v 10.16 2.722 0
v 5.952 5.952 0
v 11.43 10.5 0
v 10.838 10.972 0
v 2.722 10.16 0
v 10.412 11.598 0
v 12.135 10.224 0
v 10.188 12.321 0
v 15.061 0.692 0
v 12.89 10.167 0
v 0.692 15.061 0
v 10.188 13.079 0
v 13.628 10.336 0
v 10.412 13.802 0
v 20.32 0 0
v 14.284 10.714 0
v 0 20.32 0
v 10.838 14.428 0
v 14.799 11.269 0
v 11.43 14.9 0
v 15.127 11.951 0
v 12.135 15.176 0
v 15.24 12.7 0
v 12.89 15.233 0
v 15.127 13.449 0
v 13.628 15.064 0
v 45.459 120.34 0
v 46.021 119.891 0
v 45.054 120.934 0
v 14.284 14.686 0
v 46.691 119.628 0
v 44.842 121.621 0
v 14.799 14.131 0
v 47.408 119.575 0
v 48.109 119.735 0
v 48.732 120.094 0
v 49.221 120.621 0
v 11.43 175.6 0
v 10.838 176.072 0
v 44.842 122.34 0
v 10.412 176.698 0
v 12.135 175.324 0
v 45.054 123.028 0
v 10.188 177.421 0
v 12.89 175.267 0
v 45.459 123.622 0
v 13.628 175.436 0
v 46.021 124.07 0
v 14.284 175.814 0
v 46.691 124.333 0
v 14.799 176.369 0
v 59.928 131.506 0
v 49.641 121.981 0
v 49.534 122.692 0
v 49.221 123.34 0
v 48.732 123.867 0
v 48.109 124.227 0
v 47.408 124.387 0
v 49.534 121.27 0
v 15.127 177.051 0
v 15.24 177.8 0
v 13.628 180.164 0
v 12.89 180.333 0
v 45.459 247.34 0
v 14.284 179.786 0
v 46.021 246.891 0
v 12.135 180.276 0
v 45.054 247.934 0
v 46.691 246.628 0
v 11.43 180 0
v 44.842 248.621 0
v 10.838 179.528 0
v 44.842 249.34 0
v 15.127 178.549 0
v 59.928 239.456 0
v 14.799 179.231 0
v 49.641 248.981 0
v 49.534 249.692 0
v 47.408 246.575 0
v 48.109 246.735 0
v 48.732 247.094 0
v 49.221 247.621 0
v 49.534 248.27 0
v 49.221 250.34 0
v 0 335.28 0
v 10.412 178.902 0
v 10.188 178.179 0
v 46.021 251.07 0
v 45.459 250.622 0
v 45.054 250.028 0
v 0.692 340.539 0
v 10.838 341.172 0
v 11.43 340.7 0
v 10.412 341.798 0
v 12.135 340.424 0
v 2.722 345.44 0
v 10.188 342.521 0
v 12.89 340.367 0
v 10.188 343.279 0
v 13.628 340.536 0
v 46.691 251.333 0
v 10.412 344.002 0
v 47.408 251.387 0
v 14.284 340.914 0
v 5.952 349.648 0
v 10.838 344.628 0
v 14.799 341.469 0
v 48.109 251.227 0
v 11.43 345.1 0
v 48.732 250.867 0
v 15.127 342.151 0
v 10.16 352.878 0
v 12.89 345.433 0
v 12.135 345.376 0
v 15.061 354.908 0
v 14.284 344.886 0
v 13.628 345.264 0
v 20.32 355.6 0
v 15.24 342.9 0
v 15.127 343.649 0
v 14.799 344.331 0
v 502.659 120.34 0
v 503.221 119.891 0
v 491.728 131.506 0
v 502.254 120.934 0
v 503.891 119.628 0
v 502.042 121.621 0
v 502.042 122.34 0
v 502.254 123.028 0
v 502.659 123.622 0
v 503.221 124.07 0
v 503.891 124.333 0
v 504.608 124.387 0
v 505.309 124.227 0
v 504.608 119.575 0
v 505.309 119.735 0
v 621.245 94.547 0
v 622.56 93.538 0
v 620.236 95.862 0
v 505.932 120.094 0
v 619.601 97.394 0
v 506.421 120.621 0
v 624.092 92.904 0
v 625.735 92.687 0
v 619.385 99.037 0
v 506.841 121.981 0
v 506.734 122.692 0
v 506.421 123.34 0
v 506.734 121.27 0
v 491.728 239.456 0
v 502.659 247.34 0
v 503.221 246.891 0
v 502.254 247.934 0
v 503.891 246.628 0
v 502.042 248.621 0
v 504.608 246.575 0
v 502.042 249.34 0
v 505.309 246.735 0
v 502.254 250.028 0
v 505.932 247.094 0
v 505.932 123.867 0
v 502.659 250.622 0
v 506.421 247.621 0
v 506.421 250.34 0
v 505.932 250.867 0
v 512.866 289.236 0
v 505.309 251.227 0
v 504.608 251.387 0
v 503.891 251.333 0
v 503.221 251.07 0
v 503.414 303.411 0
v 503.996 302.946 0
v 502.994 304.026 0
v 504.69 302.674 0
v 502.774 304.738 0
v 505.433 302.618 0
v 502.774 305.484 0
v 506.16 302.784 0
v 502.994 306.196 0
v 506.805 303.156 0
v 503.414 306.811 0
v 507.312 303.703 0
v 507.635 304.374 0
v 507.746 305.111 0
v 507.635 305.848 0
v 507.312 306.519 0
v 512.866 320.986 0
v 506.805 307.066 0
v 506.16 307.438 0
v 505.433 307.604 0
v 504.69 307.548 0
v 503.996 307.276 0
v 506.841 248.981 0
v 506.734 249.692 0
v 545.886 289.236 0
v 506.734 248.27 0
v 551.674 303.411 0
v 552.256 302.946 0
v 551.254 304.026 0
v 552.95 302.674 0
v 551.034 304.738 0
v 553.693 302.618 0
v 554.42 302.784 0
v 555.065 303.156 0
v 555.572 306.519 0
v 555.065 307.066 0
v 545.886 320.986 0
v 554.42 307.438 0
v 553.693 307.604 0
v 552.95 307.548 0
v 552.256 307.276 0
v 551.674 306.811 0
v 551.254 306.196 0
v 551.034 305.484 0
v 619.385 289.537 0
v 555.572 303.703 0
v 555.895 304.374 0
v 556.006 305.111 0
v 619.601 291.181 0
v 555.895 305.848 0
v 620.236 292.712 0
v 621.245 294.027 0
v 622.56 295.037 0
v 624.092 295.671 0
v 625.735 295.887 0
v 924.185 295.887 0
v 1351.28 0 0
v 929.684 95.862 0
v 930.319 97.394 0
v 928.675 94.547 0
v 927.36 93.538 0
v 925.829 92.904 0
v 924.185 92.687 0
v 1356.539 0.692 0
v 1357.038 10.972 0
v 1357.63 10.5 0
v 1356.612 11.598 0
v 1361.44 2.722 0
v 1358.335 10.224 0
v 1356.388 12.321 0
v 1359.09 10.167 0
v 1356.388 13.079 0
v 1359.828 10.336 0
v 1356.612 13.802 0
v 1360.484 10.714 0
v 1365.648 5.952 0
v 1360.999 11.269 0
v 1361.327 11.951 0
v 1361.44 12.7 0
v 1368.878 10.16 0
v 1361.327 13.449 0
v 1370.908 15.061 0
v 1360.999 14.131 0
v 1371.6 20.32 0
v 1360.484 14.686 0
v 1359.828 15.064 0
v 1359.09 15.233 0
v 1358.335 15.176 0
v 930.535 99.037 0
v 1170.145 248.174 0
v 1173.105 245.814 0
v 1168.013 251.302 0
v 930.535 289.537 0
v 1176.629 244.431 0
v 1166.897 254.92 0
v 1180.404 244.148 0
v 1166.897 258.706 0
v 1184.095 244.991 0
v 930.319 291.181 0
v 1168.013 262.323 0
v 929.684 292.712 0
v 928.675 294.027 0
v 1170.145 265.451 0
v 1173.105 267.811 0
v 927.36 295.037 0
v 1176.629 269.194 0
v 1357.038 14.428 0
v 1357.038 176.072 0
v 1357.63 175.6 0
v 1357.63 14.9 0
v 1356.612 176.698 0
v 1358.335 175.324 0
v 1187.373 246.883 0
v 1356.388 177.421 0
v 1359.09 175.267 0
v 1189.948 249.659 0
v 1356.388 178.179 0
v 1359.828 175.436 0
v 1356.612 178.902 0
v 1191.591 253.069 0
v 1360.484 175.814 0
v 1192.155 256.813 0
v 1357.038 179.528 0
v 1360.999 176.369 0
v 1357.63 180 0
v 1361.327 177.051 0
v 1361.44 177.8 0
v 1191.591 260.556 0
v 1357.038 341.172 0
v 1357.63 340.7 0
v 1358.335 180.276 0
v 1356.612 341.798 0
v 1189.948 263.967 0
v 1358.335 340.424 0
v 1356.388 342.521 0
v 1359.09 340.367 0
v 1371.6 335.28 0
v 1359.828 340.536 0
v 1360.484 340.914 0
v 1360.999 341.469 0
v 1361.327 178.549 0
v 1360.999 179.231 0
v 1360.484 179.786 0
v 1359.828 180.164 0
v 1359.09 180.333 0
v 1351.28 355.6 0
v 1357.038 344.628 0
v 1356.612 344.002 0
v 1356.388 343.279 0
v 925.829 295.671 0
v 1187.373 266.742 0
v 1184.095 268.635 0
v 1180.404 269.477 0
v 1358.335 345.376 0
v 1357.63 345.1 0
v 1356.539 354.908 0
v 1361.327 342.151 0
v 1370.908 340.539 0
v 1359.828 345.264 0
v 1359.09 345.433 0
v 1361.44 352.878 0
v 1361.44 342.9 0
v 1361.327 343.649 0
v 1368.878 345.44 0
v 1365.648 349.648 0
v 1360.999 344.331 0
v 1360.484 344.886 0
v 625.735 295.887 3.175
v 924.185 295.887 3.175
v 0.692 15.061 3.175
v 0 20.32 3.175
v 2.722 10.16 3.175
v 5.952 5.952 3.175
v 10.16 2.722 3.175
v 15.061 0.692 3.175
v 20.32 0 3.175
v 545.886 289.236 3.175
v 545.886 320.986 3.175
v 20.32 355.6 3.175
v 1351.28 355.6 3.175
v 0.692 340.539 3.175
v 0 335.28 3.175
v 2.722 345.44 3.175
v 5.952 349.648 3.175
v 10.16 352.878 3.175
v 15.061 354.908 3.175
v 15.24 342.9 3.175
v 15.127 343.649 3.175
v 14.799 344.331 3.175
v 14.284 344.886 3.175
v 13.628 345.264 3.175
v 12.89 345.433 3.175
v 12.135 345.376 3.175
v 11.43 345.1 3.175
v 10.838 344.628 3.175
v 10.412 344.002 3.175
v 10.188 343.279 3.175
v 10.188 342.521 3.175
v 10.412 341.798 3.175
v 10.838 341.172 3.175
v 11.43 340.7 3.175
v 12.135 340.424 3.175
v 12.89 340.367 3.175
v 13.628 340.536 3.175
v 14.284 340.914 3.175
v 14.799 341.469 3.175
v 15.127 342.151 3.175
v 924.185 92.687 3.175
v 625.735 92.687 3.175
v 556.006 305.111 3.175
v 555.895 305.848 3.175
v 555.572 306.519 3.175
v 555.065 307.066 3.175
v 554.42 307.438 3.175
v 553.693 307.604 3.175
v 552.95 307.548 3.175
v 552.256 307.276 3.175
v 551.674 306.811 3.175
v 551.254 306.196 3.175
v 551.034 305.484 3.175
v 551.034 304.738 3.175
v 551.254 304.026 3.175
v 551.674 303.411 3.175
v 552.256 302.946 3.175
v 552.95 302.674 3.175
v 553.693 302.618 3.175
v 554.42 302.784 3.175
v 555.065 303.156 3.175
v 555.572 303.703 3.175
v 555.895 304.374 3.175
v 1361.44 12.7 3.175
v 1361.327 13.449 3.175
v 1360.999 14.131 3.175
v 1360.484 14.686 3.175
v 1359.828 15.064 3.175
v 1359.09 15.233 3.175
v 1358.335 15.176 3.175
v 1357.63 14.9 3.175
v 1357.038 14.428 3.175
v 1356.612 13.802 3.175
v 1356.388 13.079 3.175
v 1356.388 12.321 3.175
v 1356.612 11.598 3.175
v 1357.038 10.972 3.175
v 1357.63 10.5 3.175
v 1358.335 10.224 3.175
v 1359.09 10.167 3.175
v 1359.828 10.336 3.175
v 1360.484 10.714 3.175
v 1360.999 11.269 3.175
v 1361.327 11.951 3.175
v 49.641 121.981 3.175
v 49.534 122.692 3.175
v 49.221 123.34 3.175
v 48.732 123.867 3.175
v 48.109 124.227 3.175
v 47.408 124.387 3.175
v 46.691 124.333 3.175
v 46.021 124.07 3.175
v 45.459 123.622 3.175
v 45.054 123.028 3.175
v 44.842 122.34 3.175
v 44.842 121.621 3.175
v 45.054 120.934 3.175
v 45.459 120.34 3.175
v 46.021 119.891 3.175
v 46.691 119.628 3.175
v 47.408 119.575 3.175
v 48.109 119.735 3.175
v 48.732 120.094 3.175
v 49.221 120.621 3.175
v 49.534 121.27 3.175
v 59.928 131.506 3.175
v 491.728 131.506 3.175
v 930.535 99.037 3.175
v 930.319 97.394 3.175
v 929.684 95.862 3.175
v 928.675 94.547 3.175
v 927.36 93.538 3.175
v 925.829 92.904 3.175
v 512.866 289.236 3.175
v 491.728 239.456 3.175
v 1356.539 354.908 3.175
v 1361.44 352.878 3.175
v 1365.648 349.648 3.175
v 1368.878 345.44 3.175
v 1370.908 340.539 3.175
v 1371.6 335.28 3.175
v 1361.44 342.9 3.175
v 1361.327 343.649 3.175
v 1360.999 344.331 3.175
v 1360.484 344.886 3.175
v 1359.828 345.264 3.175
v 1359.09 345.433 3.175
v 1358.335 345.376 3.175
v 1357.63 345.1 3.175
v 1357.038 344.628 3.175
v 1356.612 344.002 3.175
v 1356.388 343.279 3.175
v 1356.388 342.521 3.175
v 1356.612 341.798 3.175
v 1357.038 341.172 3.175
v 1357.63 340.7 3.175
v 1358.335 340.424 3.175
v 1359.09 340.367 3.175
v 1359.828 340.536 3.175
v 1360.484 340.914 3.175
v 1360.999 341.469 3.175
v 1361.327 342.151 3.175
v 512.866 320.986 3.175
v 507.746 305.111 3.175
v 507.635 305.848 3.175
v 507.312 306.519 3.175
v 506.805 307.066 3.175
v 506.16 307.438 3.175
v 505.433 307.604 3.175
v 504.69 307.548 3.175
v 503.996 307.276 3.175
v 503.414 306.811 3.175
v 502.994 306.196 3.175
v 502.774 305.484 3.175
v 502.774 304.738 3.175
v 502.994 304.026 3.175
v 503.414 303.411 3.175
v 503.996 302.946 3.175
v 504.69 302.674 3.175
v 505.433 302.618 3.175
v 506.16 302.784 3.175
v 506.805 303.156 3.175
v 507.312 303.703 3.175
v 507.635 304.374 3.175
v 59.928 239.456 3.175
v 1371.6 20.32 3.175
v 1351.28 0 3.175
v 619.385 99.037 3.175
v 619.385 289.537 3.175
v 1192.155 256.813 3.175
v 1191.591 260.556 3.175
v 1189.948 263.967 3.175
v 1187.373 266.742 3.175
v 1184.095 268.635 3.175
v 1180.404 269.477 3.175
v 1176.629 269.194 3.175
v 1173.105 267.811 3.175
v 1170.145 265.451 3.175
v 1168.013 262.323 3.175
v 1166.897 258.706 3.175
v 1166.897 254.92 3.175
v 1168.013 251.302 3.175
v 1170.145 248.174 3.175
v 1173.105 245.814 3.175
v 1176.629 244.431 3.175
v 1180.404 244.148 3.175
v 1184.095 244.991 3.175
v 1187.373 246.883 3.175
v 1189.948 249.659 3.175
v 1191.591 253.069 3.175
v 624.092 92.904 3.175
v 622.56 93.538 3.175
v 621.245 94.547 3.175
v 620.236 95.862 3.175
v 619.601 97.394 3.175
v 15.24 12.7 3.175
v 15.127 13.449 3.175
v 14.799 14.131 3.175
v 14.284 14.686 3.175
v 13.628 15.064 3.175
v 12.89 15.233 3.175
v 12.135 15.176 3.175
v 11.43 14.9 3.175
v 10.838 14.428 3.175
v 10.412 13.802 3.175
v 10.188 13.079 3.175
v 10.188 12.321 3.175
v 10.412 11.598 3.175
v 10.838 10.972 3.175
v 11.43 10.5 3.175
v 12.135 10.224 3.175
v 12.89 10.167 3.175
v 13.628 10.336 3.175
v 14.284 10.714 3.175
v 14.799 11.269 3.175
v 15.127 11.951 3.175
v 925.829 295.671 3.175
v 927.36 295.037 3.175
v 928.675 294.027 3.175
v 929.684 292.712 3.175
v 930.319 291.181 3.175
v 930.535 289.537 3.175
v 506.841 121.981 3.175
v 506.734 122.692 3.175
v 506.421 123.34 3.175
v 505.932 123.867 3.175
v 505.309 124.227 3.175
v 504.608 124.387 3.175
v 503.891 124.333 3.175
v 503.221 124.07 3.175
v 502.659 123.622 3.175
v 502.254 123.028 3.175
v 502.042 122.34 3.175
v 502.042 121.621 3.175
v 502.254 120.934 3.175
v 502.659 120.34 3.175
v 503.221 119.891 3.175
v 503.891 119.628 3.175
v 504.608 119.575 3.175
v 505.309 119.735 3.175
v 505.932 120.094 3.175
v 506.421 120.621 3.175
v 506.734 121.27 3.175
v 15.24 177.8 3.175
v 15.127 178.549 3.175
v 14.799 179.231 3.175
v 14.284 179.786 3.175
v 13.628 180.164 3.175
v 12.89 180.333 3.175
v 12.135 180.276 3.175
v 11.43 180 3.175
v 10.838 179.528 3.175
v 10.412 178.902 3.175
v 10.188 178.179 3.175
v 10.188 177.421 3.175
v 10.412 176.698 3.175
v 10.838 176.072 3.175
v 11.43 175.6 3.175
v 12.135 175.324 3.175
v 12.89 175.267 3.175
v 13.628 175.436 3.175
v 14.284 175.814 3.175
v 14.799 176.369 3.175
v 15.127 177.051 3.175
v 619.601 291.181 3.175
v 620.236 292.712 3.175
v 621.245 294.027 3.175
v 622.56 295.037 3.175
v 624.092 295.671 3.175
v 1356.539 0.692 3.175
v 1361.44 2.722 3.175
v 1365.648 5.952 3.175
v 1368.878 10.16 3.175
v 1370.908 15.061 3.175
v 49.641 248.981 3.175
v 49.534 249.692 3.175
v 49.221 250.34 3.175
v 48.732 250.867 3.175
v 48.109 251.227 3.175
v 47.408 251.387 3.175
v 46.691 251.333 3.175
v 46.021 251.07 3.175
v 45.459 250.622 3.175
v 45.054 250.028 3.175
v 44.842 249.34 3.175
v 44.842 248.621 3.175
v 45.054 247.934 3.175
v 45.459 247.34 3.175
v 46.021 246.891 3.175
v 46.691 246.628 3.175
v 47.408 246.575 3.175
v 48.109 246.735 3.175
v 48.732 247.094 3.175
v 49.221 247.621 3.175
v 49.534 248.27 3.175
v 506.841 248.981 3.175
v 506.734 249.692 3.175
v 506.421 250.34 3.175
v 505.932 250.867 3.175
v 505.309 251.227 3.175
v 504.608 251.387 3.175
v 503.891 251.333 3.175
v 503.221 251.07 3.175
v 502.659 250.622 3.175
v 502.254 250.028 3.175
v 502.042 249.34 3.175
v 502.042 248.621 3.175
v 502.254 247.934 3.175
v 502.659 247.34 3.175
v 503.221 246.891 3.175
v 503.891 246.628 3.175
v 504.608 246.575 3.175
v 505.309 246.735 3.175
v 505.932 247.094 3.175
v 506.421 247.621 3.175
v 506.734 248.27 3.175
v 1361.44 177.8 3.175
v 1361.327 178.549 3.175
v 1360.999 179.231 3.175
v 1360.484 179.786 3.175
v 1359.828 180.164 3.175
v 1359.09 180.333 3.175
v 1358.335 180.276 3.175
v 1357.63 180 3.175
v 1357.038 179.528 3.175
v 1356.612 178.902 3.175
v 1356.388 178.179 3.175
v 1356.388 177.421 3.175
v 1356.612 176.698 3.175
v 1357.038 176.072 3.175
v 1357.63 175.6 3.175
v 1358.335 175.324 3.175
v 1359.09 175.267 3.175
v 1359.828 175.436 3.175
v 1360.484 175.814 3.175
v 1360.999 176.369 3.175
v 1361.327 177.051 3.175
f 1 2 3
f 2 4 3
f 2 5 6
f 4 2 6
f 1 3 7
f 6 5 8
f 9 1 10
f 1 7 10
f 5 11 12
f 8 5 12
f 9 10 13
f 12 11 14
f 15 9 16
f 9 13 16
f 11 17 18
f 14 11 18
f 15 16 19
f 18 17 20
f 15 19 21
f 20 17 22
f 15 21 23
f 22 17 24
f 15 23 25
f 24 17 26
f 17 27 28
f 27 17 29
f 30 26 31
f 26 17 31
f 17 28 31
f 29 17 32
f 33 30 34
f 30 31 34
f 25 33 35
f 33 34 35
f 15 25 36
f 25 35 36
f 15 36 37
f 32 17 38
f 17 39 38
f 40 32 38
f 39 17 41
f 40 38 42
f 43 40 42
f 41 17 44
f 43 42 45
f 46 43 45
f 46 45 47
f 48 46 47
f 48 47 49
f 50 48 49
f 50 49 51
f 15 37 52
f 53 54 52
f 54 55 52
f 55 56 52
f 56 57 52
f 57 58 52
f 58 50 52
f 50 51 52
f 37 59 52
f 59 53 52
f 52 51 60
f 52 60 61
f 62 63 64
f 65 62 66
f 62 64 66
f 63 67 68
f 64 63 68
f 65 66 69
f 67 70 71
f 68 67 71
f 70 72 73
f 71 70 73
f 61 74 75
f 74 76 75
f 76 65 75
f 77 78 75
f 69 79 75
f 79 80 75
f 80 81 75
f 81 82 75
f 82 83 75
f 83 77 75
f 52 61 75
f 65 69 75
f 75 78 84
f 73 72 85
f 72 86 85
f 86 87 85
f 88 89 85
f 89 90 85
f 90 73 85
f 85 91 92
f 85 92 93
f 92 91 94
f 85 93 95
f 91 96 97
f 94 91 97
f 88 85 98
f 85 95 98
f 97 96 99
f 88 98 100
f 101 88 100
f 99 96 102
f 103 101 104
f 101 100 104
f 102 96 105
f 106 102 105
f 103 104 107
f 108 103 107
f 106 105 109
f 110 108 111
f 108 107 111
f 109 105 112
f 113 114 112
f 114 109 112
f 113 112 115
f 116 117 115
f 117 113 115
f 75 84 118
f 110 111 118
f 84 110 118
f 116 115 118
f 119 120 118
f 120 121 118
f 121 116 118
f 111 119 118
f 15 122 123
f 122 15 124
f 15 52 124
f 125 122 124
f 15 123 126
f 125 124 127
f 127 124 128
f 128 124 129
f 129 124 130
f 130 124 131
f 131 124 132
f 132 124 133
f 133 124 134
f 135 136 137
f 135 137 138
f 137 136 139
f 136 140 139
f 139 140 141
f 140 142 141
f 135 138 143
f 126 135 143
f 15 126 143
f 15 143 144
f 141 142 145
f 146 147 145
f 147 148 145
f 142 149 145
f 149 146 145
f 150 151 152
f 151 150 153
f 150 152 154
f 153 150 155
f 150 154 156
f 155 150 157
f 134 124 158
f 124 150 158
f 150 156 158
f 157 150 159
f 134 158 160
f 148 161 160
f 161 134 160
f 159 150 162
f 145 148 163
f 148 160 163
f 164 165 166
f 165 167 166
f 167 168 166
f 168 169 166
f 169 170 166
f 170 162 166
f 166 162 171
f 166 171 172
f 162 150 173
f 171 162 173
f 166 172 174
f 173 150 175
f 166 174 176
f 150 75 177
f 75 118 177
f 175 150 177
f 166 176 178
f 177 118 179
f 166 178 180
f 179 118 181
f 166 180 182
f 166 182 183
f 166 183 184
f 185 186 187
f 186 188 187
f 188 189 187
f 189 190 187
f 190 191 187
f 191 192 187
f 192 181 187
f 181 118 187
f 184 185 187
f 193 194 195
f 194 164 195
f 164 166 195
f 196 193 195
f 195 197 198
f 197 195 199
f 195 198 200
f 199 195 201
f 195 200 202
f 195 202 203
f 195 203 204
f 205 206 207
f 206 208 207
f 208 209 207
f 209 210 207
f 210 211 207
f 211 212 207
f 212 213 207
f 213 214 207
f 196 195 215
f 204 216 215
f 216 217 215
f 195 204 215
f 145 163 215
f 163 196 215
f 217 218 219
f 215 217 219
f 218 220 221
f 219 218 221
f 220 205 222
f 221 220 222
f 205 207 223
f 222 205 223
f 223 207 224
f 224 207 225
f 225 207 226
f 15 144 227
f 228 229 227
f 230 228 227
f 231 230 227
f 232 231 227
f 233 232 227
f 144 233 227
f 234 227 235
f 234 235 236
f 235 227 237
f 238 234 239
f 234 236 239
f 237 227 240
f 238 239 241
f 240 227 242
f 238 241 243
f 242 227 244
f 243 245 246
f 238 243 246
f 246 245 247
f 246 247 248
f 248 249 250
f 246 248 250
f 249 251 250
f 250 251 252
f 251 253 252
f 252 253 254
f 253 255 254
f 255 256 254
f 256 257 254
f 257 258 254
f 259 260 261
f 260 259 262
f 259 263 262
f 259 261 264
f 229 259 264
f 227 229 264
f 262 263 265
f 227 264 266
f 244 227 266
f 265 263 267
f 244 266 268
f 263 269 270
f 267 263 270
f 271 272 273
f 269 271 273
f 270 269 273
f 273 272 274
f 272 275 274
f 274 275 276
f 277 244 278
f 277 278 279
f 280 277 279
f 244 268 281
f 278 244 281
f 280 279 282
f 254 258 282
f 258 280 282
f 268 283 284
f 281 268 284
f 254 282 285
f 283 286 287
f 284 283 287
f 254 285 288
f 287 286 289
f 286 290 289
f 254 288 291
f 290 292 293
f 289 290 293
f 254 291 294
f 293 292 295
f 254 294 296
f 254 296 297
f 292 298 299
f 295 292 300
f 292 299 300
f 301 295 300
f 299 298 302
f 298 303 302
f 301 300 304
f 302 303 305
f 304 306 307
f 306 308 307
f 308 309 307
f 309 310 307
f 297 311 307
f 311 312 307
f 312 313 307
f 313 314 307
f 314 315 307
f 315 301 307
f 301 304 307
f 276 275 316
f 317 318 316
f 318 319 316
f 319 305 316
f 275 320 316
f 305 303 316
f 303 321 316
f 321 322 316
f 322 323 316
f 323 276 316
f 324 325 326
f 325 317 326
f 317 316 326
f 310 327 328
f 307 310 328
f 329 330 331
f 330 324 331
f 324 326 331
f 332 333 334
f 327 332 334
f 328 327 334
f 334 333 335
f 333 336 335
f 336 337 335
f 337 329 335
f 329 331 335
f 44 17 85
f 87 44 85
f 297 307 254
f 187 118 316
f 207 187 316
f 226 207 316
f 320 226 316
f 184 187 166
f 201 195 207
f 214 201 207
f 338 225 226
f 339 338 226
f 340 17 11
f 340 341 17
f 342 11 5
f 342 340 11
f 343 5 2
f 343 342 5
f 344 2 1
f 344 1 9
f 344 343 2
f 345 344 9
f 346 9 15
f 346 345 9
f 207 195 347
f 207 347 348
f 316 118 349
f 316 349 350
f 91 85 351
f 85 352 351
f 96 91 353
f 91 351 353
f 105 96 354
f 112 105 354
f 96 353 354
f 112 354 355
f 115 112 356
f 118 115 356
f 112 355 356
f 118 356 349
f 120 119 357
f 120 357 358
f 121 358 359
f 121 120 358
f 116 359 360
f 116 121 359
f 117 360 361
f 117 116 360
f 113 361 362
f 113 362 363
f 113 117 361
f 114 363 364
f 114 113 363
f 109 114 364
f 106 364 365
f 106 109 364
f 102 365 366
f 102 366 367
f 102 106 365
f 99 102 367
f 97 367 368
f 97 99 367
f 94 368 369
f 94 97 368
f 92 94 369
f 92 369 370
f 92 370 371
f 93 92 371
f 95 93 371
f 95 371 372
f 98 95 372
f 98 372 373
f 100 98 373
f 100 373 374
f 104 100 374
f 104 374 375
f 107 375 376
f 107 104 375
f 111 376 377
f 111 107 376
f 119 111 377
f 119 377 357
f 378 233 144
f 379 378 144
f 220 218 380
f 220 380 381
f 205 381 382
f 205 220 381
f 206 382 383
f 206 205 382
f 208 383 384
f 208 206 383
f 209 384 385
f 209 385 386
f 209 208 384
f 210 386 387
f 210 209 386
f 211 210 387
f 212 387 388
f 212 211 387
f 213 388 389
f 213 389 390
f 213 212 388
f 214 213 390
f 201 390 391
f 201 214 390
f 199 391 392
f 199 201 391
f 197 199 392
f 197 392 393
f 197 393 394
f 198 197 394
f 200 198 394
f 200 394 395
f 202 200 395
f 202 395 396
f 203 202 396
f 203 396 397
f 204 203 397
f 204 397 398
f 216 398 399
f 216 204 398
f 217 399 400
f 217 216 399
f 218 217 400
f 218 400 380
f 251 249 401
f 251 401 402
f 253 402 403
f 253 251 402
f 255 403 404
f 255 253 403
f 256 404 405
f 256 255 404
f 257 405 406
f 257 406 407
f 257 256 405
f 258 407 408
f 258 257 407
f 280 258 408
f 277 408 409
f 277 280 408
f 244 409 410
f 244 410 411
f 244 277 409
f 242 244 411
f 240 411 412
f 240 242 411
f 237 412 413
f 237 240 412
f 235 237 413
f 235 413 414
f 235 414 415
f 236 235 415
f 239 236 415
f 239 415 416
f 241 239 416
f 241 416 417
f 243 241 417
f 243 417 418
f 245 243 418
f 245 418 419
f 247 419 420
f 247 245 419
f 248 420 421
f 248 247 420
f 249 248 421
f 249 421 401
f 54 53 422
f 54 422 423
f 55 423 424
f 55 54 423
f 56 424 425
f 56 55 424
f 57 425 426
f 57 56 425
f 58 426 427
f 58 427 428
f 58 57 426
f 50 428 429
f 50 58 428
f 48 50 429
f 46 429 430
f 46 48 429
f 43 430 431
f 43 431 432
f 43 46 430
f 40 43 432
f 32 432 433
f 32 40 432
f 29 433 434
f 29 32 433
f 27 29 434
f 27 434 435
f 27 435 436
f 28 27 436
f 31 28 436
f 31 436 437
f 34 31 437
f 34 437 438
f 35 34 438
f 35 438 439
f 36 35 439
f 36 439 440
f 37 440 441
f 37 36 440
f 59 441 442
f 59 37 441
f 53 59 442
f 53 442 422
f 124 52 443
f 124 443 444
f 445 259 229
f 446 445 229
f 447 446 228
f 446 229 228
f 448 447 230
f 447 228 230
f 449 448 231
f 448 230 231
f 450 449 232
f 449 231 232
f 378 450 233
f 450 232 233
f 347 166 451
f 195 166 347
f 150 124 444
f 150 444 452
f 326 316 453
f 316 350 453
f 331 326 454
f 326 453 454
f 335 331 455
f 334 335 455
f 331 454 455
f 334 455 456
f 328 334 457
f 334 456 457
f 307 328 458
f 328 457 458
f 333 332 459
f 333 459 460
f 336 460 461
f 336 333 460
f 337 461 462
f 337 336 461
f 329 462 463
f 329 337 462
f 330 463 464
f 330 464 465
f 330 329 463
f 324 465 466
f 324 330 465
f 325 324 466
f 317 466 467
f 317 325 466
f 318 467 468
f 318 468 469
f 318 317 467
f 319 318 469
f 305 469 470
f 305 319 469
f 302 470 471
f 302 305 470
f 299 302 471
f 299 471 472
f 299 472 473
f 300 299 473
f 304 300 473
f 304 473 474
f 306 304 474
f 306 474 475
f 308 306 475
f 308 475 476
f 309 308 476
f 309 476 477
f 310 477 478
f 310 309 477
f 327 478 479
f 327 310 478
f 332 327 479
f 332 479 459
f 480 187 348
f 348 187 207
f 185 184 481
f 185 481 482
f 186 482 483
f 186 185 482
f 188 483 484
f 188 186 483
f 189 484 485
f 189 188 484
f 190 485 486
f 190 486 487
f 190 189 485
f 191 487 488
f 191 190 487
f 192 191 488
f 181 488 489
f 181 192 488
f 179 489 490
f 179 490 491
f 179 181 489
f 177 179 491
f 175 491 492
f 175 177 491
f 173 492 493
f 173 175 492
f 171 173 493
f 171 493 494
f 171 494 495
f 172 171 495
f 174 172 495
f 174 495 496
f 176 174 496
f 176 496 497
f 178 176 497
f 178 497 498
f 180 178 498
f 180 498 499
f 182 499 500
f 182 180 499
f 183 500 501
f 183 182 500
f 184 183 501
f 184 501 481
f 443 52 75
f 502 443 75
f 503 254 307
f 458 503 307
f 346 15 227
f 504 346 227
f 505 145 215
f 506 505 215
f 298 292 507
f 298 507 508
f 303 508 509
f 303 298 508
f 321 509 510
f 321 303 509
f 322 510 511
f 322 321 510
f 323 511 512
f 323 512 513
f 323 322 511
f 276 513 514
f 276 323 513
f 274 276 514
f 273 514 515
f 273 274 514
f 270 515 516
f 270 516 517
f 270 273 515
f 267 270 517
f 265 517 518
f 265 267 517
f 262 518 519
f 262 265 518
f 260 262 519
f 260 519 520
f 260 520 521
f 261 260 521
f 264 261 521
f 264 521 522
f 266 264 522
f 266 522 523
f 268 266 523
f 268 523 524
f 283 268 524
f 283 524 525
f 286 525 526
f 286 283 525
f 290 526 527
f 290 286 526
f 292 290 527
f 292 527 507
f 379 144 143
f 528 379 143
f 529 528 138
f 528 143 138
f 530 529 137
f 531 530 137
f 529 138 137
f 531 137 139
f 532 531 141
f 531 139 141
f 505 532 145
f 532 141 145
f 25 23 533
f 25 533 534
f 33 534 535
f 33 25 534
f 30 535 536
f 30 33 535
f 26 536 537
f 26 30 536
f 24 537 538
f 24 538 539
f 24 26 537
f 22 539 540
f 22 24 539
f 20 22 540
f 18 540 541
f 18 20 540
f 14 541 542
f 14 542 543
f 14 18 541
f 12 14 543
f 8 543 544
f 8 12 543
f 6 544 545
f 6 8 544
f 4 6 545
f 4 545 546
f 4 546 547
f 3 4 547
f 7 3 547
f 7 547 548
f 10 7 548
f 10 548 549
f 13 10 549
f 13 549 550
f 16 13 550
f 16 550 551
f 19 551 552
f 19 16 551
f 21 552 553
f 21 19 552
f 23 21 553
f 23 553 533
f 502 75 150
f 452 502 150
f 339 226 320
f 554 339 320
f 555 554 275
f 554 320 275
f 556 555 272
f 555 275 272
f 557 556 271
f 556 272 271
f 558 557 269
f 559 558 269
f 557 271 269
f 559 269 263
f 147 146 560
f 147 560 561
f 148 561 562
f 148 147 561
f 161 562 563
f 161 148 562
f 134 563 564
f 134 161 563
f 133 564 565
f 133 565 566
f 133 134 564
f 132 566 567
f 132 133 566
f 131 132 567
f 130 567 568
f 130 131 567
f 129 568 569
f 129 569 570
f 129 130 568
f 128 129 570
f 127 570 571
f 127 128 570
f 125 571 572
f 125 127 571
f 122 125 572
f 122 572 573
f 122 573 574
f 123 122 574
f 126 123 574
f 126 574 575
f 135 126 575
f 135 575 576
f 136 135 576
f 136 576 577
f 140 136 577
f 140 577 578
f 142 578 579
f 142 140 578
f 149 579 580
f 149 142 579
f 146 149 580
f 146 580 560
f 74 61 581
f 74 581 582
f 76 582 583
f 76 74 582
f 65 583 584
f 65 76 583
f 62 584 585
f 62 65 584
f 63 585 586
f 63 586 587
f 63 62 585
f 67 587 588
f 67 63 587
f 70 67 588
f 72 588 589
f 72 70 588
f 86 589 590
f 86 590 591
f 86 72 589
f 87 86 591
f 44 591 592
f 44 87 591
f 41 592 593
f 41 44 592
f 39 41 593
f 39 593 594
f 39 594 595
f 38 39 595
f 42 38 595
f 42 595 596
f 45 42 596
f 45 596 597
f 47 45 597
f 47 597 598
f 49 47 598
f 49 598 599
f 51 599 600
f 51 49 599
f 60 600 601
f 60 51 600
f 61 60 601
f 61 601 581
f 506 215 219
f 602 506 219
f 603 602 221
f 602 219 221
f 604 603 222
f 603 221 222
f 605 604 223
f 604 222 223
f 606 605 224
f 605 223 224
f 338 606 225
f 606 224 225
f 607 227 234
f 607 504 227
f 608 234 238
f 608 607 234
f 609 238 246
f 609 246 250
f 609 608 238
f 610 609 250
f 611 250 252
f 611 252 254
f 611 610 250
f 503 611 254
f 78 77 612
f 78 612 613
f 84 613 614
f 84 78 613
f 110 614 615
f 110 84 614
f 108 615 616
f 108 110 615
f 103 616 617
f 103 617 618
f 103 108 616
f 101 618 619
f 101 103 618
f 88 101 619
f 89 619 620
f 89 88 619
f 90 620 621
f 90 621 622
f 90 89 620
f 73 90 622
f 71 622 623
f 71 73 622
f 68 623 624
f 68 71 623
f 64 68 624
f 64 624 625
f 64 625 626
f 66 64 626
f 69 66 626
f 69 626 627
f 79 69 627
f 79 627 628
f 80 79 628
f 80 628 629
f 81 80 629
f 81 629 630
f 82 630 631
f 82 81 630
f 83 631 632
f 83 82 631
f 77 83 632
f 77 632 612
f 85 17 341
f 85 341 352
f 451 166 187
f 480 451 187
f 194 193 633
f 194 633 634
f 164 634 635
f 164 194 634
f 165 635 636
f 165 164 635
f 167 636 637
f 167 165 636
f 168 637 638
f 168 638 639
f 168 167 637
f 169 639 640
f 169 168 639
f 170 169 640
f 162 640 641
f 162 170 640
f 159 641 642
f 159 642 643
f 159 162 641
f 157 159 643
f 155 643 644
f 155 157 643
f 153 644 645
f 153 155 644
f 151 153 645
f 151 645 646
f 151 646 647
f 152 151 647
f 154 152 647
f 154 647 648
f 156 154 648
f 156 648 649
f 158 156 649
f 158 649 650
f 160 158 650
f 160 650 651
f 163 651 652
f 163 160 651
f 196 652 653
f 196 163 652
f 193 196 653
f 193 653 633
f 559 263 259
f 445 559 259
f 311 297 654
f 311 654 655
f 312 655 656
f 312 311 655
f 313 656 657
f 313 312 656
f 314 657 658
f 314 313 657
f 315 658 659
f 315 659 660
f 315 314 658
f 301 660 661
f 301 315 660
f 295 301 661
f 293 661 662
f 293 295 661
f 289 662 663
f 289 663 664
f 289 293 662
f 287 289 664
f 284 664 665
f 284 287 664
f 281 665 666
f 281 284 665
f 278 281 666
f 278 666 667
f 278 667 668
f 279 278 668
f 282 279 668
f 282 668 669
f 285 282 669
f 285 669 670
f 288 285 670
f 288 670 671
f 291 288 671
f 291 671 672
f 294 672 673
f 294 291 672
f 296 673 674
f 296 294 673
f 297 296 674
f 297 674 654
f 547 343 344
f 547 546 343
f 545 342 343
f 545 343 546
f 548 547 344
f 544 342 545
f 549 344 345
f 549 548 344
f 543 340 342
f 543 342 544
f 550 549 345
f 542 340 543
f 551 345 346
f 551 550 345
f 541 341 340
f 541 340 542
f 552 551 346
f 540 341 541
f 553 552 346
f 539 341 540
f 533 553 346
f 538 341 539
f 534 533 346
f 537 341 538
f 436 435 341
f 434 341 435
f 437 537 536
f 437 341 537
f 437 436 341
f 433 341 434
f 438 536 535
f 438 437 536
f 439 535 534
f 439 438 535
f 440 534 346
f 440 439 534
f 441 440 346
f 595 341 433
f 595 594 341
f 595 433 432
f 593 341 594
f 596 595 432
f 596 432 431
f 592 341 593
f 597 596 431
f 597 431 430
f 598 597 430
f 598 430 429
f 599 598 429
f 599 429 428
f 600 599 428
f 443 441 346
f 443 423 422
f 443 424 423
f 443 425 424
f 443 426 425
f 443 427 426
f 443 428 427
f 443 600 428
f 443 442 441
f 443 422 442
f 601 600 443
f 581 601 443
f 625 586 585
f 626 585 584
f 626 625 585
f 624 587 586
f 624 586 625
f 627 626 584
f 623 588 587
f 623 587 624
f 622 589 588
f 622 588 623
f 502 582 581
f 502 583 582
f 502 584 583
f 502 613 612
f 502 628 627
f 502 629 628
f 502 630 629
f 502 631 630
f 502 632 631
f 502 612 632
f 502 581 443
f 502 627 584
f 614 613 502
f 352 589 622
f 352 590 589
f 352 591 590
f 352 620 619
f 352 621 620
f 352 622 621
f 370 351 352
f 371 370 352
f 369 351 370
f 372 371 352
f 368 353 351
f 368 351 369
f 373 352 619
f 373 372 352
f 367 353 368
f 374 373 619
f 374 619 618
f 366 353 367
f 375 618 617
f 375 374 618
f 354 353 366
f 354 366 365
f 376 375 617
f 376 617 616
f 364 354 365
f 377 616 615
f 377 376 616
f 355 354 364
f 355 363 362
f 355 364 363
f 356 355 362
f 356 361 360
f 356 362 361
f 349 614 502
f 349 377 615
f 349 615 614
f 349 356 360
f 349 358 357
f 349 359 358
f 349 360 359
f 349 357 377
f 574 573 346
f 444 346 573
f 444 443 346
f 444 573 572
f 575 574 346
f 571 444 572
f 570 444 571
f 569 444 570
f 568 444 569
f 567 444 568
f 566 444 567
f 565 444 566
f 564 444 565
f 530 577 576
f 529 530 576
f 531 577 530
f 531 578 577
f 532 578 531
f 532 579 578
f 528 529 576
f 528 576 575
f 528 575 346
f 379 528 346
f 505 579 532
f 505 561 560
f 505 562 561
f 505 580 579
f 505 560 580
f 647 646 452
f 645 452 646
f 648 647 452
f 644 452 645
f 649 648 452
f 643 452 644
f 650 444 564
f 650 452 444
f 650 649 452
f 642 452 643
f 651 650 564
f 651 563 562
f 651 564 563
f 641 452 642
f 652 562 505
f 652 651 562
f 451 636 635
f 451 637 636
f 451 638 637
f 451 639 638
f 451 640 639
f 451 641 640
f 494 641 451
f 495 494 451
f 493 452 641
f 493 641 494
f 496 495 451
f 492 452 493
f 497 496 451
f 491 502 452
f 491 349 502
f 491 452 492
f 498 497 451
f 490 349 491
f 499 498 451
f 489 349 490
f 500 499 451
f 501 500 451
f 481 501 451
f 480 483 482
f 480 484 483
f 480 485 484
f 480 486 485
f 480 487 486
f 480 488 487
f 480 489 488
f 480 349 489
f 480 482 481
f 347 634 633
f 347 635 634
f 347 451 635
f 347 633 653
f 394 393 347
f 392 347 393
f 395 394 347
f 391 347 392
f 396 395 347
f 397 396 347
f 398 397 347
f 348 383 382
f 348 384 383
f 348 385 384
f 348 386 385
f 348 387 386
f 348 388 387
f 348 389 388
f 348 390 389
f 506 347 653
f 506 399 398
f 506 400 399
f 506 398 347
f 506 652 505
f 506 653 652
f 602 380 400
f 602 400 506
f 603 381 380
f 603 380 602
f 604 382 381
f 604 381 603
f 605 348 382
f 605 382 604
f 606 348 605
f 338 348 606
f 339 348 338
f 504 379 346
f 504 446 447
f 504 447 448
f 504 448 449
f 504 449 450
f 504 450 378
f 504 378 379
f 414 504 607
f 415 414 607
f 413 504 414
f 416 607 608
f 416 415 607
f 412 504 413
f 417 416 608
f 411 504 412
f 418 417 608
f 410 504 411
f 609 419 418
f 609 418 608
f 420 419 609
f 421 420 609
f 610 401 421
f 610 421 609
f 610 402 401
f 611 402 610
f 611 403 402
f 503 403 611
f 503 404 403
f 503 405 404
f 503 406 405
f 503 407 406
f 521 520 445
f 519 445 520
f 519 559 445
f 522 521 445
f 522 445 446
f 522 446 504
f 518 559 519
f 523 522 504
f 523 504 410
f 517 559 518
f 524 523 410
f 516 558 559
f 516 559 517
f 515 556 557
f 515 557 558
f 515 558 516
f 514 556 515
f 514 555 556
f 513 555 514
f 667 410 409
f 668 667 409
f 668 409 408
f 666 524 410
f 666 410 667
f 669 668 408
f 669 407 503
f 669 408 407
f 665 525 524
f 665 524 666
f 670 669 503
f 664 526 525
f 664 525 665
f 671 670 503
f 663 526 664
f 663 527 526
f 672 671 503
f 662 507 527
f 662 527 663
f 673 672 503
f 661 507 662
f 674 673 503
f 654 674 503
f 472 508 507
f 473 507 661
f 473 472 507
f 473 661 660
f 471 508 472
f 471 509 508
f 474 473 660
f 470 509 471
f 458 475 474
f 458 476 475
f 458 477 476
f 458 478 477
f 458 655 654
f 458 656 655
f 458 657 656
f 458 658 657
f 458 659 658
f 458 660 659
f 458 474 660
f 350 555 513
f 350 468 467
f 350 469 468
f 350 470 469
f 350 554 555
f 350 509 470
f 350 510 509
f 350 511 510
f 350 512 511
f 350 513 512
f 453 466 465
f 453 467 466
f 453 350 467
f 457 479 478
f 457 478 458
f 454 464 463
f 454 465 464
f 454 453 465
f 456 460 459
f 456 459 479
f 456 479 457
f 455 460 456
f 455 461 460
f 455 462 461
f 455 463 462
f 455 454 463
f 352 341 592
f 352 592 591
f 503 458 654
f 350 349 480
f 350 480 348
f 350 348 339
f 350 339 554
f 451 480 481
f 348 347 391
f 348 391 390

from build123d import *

# Parameters (mm, degrees)
F0_W     = 1371.6
F0_H     = 355.6
F0_R     = 2.54
F0_R_2   = 2.413
F0_W_2   = 431.8
F0_H_2   = 107.95
F0_R_3   = 2.5
F0_W_3   = 33.02
F0_H_3   = 31.75
F0_R_4   = 12.7
F1_DEPTH = 3.175
F2_R     = 20.32


with BuildPart() as f1:
    # F0 (on Top) → F1 (new body)
    with BuildSketch(Plane.XY):
        with Locations((685.8, 177.8)):
            Rectangle(F0_W, F0_H)
        with Locations((12.7, 12.7)):
            Circle(F0_R, mode=Mode.SUBTRACT)
        with Locations((47.227706, 121.980773)):
            Circle(F0_R_2, mode=Mode.SUBTRACT)
        with Locations((504.427706, 121.980773)):
            Circle(F0_R_2, mode=Mode.SUBTRACT)
        with Locations((1358.9, 12.7)):
            Circle(F0_R, mode=Mode.SUBTRACT)
        with Locations((12.7, 177.8)):
            Circle(F0_R, mode=Mode.SUBTRACT)
        with Locations((275.827706, 185.480773)):
            Rectangle(F0_W_2, F0_H_2, mode=Mode.SUBTRACT)
        with Locations((47.227706, 248.980773)):
            Circle(F0_R_2, mode=Mode.SUBTRACT)
        with Locations((504.427706, 248.980773)):
            Circle(F0_R_2, mode=Mode.SUBTRACT)
        with Locations((12.7, 342.9)):
            Circle(F0_R, mode=Mode.SUBTRACT)
        with Locations((505.246378, 305.110961)):
            Circle(F0_R_3, mode=Mode.SUBTRACT)
        with Locations((529.376378, 305.110961)):
            Rectangle(F0_W_3, F0_H_3, mode=Mode.SUBTRACT)
        with Locations((553.506378, 305.110961)):
            Circle(F0_R_3, mode=Mode.SUBTRACT)
        with BuildLine():
            ThreePointArc((619.385123, 289.537351), (621.244995, 294.027479), (625.735123, 295.887351))
            Line((625.735123, 295.887351), (924.185123, 295.887351))
            ThreePointArc((924.185123, 295.887351), (928.675251, 294.027479), (930.535123, 289.537351))
            Line((930.535123, 289.537351), (930.535123, 99.037351))
            ThreePointArc((930.535123, 99.037351), (928.675251, 94.547223), (924.185123, 92.687351))
            Line((924.185123, 92.687351), (625.735123, 92.687351))
            ThreePointArc((625.735123, 92.687351), (621.244995, 94.547223), (619.385123, 99.037351))
            Line((619.385123, 99.037351), (619.385123, 289.537351))
        make_face(mode=Mode.SUBTRACT)
        with Locations((1358.9, 177.8)):
            Circle(F0_R, mode=Mode.SUBTRACT)
        with Locations((1179.455161, 256.812692)):
            Circle(F0_R_4, mode=Mode.SUBTRACT)
        with Locations((1358.9, 342.9)):
            Circle(F0_R, mode=Mode.SUBTRACT)
    extrude(amount=F1_DEPTH)

    # F2
    f2_edges = [f1.edges().sort_by_distance(p)[0] for p in [
        (0, 355.6, 1.5875),
        (0, 0, 1.5875),
        (1371.6, 0, 1.5875),
        (1371.6, 355.6, 1.5875),
    ]]
    fillet(f2_edges, radius=F2_R)


solid = f1.part
